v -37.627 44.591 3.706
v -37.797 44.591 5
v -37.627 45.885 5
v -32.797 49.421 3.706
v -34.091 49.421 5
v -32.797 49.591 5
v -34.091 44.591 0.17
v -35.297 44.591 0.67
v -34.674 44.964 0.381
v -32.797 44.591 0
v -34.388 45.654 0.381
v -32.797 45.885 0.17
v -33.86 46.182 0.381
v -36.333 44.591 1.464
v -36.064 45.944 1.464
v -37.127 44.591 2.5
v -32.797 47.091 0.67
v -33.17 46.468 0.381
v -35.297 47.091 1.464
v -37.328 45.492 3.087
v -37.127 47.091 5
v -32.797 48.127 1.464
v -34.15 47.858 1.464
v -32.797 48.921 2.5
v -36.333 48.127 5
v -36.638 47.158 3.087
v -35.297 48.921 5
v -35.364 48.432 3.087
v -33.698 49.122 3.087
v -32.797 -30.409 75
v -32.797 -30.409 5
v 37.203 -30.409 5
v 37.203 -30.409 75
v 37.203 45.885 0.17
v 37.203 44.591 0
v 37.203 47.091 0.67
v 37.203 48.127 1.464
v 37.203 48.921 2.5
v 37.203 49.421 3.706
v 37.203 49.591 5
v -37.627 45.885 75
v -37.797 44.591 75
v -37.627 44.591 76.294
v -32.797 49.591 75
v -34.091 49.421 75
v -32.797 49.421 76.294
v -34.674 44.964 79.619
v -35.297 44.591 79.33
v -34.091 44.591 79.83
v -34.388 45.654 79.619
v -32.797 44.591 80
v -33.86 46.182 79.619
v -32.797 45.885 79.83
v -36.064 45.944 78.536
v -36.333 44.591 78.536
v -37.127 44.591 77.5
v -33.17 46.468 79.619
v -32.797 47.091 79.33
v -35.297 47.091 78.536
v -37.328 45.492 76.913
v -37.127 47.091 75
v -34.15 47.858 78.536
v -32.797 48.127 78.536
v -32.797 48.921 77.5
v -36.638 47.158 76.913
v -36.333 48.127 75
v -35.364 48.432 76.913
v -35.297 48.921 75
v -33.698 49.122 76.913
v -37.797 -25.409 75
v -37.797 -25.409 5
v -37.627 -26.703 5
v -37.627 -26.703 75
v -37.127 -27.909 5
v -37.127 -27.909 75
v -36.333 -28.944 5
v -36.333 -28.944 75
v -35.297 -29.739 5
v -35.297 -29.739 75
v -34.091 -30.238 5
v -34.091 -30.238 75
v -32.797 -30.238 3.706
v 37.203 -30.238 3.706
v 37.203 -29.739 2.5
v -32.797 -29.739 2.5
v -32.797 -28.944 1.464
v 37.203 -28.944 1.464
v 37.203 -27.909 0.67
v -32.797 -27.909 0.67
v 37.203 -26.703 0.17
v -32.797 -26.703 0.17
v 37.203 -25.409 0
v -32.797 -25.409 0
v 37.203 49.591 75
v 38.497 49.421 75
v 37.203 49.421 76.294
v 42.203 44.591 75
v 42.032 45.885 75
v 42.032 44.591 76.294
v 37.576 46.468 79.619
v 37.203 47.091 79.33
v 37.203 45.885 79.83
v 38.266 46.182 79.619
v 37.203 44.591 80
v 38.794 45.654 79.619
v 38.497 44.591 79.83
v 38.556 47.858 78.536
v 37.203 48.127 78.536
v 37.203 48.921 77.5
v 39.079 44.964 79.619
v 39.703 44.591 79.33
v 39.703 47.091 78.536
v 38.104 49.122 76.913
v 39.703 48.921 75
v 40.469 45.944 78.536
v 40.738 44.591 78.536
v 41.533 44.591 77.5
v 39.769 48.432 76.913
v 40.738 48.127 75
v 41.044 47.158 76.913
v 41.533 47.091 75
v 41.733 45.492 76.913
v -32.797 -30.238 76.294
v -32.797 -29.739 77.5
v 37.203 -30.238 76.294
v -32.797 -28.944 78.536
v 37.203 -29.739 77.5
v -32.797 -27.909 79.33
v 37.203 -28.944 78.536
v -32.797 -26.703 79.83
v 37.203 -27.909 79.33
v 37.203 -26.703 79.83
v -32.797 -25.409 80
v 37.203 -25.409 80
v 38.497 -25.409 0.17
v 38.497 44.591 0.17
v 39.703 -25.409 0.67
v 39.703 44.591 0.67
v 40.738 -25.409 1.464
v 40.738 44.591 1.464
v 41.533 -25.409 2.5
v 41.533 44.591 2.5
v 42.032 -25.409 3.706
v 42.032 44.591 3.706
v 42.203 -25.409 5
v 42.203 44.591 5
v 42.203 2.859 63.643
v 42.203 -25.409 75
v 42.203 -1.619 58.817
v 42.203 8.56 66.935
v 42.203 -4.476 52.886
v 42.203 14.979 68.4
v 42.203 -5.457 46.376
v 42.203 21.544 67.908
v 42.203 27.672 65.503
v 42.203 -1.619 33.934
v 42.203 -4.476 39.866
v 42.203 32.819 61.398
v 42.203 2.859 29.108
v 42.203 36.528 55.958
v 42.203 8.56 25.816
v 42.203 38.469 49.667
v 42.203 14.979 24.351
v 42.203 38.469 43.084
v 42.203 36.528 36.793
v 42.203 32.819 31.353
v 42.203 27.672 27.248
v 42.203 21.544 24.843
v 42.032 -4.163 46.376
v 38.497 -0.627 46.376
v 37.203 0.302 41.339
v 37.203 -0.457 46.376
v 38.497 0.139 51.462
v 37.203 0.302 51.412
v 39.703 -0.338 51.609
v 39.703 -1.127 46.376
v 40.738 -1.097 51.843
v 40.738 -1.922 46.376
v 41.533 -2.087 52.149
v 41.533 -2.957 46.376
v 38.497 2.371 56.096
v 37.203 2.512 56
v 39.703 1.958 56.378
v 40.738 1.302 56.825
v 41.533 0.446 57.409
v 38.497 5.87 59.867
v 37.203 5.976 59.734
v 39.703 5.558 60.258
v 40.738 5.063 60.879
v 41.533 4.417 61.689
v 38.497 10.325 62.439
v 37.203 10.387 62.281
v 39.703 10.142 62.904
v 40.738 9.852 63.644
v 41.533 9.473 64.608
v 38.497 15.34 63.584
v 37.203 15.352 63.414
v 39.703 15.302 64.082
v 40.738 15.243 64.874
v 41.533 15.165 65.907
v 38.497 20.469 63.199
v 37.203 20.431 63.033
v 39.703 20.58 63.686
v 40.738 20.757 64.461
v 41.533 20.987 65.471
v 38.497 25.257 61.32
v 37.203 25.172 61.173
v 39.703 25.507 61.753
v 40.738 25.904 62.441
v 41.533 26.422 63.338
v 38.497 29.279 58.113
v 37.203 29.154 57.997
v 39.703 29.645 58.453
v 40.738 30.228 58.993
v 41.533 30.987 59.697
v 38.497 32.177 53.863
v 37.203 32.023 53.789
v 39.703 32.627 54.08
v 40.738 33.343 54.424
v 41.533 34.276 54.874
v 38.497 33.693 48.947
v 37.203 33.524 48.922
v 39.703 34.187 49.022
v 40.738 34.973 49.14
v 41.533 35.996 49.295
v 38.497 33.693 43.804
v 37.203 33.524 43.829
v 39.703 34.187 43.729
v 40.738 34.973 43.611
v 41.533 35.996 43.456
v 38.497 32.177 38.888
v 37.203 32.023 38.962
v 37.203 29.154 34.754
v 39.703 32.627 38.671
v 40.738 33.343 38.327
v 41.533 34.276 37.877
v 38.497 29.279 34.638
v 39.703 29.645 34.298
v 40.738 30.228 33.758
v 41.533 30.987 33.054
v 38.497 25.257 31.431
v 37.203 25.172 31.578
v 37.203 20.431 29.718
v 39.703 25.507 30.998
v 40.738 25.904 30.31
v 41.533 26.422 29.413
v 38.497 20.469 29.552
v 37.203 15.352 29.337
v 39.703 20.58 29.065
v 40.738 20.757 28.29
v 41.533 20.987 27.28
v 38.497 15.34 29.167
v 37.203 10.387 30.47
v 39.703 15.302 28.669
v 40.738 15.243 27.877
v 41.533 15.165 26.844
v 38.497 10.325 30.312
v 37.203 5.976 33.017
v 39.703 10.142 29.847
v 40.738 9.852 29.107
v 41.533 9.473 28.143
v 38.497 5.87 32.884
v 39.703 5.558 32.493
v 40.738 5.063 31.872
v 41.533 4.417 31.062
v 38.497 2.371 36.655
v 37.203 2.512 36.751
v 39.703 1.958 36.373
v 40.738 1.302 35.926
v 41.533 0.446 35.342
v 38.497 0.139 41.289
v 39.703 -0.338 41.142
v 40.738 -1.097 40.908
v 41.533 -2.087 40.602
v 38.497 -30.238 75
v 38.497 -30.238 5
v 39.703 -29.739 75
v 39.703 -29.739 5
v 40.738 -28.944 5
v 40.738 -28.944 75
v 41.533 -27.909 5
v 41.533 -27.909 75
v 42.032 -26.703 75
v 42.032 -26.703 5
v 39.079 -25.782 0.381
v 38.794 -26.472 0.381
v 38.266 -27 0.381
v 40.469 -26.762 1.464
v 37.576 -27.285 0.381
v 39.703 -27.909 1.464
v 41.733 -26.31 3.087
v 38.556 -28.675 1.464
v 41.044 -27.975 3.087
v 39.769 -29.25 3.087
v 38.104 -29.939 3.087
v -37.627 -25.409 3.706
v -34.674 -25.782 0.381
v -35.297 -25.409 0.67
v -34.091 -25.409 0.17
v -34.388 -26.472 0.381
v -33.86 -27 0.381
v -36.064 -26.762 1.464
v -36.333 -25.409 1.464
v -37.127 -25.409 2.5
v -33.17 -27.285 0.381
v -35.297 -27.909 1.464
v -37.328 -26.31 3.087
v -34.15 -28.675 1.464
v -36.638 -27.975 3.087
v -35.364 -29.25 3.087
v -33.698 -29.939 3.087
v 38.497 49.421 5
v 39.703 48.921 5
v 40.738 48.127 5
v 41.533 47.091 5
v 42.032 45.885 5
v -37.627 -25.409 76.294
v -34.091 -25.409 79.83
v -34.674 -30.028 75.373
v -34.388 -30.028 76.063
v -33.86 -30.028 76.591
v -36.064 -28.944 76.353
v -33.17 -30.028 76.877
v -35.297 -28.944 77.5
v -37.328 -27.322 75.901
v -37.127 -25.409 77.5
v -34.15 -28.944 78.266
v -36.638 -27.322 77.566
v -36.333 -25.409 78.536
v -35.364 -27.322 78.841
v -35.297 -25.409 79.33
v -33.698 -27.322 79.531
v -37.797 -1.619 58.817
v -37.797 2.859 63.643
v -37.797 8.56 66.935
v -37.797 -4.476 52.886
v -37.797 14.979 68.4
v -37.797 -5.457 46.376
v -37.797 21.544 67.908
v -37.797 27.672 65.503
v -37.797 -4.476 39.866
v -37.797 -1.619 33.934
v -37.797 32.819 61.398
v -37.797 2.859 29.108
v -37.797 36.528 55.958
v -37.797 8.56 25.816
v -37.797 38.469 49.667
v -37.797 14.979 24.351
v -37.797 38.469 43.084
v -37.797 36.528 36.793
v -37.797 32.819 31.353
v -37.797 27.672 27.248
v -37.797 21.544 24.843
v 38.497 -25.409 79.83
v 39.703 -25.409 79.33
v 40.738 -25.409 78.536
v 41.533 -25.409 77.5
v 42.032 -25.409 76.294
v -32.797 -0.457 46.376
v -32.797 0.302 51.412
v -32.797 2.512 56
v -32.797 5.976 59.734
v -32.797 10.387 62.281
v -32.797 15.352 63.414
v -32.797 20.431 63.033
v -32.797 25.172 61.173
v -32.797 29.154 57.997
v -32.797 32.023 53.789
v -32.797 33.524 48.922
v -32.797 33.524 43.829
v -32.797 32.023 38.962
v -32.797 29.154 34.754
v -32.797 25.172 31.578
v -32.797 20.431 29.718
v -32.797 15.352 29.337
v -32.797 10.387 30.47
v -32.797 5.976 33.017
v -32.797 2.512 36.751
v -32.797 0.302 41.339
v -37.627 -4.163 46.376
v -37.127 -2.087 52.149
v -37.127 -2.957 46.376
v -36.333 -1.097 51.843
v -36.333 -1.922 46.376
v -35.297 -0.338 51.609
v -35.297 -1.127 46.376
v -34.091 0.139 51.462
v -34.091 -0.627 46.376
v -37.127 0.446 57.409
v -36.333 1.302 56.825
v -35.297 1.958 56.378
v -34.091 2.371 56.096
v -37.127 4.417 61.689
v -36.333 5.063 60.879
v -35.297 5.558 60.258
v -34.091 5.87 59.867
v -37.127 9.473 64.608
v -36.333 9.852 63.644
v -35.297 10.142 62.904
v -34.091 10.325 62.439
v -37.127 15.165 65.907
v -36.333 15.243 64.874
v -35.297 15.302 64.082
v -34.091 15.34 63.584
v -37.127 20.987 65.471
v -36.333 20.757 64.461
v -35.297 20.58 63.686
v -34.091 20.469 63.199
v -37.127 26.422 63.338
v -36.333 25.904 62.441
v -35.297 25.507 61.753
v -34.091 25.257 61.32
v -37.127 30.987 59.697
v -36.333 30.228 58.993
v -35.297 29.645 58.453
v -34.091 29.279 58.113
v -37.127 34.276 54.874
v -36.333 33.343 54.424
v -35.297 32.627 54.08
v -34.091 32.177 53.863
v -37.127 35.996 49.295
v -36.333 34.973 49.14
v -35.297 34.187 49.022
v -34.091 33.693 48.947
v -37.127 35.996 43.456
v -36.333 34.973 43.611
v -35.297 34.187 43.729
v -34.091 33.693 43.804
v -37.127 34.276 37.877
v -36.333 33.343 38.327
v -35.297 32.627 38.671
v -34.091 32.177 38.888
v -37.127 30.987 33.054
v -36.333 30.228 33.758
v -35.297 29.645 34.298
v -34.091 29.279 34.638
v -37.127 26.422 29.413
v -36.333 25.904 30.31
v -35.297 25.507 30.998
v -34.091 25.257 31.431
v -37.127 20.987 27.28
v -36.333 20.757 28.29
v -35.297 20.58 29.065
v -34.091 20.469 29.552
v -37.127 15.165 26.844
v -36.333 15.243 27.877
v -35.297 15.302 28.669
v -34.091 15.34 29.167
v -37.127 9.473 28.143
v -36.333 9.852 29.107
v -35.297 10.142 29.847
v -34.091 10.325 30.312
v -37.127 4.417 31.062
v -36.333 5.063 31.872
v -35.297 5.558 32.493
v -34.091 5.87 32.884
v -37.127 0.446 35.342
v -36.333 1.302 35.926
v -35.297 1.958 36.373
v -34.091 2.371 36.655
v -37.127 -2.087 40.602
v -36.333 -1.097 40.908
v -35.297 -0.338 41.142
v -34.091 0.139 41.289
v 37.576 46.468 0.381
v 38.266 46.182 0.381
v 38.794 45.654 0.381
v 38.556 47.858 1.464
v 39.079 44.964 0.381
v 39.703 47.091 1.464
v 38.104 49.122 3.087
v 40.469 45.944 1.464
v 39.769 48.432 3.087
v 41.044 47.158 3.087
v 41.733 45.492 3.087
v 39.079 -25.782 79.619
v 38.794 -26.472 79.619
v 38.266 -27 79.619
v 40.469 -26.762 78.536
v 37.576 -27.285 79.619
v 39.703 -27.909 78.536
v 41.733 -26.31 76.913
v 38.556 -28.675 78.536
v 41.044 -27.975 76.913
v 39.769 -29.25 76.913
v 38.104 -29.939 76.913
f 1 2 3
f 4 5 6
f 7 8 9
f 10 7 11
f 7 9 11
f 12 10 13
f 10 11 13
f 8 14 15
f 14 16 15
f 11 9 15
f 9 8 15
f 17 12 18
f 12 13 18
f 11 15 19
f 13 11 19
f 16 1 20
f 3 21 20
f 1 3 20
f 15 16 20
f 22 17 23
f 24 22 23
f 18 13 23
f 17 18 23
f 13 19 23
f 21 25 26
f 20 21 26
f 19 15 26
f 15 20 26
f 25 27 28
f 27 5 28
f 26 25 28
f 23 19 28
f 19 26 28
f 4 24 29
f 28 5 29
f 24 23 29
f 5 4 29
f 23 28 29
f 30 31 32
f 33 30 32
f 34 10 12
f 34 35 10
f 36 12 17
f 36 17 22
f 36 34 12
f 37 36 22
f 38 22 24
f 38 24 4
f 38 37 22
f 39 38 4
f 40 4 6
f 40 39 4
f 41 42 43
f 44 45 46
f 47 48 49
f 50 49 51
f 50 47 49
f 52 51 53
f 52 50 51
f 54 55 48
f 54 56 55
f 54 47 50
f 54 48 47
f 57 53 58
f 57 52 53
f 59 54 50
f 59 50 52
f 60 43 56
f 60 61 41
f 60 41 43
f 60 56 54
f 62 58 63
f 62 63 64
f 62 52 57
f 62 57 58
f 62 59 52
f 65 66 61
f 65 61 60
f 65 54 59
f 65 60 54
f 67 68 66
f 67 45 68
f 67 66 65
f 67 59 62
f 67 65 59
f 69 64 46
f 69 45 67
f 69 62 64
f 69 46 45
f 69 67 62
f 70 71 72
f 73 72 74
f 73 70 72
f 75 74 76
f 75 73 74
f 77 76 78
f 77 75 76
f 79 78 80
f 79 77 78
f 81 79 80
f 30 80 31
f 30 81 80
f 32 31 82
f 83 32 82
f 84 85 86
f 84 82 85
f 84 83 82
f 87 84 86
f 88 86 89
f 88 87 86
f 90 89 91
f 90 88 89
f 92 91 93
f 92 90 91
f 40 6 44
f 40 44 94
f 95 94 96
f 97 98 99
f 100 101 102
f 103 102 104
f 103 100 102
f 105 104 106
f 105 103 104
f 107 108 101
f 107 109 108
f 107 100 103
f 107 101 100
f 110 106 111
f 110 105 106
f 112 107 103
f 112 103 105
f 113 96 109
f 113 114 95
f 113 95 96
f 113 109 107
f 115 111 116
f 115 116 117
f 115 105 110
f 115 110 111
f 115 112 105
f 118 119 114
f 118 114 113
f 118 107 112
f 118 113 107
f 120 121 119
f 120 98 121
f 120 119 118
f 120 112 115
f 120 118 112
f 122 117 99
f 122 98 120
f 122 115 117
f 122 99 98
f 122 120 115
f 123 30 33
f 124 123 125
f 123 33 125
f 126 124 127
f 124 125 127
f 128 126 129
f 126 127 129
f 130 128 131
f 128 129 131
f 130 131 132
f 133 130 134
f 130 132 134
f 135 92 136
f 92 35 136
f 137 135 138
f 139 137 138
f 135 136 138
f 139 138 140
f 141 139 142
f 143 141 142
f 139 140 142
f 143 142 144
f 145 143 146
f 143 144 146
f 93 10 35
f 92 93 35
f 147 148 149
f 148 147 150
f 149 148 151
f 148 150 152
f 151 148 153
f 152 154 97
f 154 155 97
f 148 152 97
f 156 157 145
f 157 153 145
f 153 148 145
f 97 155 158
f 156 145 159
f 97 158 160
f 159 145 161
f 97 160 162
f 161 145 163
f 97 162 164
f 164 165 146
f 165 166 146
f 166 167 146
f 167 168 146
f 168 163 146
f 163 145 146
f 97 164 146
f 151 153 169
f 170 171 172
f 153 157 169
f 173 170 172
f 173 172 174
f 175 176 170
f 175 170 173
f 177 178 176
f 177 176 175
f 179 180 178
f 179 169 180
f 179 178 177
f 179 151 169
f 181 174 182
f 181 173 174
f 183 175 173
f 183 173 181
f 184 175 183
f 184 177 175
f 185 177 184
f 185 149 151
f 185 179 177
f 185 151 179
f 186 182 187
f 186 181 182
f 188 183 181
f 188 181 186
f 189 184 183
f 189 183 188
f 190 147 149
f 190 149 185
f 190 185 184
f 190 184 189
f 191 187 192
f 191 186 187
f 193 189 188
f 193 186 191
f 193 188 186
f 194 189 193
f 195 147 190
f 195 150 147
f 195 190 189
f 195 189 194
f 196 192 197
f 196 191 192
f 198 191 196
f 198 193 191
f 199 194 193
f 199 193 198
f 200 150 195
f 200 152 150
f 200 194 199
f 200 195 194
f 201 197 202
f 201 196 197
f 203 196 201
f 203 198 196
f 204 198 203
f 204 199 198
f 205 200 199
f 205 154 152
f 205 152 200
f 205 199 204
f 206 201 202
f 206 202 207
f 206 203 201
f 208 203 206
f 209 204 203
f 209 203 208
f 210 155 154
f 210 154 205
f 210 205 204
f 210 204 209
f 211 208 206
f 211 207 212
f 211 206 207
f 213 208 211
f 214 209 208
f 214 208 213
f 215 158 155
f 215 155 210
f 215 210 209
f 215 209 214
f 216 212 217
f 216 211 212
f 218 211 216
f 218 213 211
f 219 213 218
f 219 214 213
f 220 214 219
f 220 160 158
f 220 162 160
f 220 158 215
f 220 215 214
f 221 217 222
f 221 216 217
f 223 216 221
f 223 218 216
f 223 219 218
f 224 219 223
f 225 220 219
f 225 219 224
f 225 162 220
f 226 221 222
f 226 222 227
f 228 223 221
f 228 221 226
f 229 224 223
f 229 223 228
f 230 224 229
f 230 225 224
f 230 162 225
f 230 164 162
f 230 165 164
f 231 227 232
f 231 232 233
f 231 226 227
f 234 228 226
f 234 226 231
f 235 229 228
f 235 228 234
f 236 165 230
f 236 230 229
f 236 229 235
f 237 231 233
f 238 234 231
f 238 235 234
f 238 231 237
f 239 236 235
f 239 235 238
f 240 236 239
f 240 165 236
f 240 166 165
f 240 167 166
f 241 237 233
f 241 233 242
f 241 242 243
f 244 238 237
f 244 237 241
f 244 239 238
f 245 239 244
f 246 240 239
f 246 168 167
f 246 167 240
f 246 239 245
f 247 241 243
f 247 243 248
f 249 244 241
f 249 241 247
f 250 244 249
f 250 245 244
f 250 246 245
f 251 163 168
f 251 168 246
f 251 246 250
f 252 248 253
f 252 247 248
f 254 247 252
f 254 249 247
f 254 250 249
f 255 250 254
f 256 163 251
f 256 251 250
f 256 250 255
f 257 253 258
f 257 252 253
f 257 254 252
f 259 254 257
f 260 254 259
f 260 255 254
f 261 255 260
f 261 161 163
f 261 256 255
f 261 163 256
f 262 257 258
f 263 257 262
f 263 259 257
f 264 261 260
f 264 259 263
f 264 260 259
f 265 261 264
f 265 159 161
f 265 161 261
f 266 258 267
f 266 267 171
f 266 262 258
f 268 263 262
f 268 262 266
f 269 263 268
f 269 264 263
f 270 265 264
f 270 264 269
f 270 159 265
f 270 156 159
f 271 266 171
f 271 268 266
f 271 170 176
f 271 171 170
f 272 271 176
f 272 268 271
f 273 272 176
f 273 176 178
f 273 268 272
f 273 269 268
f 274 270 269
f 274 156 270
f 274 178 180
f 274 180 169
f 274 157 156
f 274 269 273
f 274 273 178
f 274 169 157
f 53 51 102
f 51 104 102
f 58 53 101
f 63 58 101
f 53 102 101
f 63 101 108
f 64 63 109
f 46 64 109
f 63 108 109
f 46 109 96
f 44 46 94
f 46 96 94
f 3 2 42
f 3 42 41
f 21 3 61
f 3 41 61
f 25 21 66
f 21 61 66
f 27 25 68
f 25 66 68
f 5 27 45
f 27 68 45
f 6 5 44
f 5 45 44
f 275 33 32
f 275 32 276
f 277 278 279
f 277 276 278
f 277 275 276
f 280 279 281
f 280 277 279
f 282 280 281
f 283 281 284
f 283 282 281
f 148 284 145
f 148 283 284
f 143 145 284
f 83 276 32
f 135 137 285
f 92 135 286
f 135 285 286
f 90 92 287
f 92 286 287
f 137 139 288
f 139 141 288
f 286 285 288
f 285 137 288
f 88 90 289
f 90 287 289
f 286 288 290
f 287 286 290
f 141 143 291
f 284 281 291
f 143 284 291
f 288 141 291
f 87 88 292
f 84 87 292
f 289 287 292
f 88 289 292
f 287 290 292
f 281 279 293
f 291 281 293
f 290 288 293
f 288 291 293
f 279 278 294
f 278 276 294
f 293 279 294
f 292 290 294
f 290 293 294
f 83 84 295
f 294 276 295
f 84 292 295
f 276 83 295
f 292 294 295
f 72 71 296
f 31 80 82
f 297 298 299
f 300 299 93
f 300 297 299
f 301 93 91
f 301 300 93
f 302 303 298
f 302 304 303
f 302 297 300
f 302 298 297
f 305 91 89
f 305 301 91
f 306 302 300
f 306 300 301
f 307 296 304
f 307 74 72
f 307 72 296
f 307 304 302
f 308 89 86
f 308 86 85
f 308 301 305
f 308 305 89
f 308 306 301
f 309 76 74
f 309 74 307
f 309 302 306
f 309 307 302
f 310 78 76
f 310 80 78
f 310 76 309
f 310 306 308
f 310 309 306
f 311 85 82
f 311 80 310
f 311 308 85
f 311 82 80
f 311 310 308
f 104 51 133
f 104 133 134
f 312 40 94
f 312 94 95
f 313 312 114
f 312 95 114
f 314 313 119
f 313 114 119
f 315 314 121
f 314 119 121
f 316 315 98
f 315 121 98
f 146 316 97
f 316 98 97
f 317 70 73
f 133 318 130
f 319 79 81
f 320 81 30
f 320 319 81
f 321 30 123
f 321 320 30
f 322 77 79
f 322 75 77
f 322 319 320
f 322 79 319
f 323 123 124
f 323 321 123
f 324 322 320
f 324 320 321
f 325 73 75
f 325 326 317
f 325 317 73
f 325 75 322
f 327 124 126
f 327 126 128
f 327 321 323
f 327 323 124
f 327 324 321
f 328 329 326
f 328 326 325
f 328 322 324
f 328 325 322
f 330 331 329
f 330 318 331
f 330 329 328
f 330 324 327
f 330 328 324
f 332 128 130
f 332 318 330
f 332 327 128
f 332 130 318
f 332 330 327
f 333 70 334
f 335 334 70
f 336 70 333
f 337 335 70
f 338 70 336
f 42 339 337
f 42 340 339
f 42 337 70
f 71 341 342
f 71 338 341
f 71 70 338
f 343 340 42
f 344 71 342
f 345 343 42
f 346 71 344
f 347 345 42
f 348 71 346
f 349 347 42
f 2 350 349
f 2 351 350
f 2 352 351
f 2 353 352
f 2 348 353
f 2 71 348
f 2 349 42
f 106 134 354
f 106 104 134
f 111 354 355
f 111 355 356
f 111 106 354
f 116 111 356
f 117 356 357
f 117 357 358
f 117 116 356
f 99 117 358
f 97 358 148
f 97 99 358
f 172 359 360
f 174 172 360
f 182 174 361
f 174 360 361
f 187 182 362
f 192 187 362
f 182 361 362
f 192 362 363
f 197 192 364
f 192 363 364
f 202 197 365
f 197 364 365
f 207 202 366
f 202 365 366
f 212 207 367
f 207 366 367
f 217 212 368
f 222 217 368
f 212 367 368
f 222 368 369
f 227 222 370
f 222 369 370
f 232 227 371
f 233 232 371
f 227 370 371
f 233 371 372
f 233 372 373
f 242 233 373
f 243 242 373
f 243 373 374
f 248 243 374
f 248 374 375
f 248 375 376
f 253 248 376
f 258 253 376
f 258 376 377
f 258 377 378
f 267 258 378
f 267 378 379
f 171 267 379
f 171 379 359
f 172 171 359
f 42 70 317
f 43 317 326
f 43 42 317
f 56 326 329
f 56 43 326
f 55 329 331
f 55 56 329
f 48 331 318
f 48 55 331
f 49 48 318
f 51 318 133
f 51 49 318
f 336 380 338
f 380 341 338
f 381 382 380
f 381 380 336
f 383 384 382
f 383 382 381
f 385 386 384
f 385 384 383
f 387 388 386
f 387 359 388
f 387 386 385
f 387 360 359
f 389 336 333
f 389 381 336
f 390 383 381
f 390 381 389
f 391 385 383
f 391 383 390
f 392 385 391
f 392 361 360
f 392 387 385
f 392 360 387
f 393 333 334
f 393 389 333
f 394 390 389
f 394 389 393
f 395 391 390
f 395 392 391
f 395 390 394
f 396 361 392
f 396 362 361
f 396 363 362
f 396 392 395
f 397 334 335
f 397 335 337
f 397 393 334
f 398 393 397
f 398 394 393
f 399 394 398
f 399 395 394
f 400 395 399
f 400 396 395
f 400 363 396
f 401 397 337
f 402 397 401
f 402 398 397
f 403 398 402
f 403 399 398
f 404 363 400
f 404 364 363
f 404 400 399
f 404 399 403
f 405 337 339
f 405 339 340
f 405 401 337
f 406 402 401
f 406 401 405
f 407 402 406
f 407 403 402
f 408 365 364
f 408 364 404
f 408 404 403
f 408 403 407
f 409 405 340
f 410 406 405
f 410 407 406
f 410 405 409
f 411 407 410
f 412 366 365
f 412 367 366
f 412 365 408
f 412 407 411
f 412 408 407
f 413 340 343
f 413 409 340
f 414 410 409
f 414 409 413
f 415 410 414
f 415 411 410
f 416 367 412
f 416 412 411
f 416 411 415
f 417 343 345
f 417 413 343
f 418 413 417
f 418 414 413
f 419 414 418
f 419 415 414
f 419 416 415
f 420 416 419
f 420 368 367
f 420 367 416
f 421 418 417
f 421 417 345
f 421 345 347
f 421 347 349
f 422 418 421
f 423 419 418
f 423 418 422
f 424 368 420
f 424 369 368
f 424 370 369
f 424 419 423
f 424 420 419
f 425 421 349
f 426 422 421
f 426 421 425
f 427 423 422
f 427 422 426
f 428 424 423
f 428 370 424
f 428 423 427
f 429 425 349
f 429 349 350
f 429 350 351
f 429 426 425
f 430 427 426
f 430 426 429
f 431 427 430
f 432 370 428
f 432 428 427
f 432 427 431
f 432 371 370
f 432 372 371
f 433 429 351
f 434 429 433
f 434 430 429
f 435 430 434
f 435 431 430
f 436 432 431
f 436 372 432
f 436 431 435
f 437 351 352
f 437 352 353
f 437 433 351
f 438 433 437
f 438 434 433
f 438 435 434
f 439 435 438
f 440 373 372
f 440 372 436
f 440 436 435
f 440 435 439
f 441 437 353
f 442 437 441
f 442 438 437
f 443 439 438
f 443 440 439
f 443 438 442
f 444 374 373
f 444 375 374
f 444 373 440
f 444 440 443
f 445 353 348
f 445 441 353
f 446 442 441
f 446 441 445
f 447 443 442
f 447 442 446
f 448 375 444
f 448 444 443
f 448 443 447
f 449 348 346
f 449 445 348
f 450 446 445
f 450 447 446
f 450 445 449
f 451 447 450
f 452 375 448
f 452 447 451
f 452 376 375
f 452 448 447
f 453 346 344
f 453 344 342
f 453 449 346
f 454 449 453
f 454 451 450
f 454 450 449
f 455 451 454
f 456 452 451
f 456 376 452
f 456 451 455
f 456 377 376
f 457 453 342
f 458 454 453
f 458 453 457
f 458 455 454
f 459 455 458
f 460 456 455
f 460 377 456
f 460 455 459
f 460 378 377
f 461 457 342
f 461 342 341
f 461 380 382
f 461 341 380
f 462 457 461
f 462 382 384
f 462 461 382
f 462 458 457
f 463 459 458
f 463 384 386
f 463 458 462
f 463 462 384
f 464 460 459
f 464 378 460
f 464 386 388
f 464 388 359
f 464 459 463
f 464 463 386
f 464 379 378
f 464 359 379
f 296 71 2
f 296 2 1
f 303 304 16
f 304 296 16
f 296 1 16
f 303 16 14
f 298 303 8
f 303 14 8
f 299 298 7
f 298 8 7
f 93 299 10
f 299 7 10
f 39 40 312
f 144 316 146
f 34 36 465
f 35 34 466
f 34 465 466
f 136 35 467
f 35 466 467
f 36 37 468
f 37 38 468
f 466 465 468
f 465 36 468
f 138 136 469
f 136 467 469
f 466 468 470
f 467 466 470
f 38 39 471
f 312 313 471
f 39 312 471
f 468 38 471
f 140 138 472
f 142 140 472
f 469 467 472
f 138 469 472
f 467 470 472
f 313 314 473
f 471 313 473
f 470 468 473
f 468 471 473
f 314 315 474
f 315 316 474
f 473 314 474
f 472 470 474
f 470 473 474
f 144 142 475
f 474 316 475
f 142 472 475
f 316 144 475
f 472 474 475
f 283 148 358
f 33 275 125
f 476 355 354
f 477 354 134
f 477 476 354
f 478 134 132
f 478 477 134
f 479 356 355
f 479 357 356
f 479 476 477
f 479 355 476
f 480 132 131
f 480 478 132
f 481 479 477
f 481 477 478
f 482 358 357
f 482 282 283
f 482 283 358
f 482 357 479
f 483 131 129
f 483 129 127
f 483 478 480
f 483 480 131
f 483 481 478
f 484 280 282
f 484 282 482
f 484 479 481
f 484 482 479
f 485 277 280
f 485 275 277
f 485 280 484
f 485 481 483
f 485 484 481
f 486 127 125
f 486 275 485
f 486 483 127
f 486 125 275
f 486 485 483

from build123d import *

# Parameters (mm, degrees)
F0_W     = 80
F0_H     = 80
F1_DEPTH = 80
F2_R     = 17.08616193
F3_DEPTH = 80.001
F4_R     = 5


with BuildPart() as f1:
    # F0 (on Top) → F1 (new body)
    with BuildSketch(Plane.XY):
        with Locations((2.2027976811, 9.5911924709)):
            Rectangle(F0_W, F0_H)
    extrude(amount=F1_DEPTH)

    # F2 (on face) → F3 (cut, through all)
    with BuildSketch(Plane(origin=(-37.7972023189, 0, 0), x_dir=(0, -1, 0), z_dir=(-1, 0, 0))):
        with Locations((-16.629083944, 46.3755141786)):
            Circle(F2_R)
    extrude(amount=-F3_DEPTH, mode=Mode.SUBTRACT)

    # F4
    f4_edges = [f1.edges().sort_by_distance(p)[0] for p in [
        (-37.797202, 49.591192, 40),
        (-37.797202, 9.591192, 80),
        (-37.797202, -30.408808, 40),
        (-37.797202, 9.591192, 0),
        (-37.797202, 33.715246, 46.375514),
        (42.202798, 49.591192, 40),
        (2.202798, 49.591192, 0),
        (2.202798, 49.591192, 80),
        (42.202798, -30.408808, 40),
        (42.202798, 9.591192, 80),
        (42.202798, 9.591192, 0),
        (42.202798, 33.715246, 46.375514),
        (2.202798, -30.408808, 0),
        (2.202798, -30.408808, 80),
    ]]
    fillet(f4_edges, radius=F4_R)


solid = f1.part
